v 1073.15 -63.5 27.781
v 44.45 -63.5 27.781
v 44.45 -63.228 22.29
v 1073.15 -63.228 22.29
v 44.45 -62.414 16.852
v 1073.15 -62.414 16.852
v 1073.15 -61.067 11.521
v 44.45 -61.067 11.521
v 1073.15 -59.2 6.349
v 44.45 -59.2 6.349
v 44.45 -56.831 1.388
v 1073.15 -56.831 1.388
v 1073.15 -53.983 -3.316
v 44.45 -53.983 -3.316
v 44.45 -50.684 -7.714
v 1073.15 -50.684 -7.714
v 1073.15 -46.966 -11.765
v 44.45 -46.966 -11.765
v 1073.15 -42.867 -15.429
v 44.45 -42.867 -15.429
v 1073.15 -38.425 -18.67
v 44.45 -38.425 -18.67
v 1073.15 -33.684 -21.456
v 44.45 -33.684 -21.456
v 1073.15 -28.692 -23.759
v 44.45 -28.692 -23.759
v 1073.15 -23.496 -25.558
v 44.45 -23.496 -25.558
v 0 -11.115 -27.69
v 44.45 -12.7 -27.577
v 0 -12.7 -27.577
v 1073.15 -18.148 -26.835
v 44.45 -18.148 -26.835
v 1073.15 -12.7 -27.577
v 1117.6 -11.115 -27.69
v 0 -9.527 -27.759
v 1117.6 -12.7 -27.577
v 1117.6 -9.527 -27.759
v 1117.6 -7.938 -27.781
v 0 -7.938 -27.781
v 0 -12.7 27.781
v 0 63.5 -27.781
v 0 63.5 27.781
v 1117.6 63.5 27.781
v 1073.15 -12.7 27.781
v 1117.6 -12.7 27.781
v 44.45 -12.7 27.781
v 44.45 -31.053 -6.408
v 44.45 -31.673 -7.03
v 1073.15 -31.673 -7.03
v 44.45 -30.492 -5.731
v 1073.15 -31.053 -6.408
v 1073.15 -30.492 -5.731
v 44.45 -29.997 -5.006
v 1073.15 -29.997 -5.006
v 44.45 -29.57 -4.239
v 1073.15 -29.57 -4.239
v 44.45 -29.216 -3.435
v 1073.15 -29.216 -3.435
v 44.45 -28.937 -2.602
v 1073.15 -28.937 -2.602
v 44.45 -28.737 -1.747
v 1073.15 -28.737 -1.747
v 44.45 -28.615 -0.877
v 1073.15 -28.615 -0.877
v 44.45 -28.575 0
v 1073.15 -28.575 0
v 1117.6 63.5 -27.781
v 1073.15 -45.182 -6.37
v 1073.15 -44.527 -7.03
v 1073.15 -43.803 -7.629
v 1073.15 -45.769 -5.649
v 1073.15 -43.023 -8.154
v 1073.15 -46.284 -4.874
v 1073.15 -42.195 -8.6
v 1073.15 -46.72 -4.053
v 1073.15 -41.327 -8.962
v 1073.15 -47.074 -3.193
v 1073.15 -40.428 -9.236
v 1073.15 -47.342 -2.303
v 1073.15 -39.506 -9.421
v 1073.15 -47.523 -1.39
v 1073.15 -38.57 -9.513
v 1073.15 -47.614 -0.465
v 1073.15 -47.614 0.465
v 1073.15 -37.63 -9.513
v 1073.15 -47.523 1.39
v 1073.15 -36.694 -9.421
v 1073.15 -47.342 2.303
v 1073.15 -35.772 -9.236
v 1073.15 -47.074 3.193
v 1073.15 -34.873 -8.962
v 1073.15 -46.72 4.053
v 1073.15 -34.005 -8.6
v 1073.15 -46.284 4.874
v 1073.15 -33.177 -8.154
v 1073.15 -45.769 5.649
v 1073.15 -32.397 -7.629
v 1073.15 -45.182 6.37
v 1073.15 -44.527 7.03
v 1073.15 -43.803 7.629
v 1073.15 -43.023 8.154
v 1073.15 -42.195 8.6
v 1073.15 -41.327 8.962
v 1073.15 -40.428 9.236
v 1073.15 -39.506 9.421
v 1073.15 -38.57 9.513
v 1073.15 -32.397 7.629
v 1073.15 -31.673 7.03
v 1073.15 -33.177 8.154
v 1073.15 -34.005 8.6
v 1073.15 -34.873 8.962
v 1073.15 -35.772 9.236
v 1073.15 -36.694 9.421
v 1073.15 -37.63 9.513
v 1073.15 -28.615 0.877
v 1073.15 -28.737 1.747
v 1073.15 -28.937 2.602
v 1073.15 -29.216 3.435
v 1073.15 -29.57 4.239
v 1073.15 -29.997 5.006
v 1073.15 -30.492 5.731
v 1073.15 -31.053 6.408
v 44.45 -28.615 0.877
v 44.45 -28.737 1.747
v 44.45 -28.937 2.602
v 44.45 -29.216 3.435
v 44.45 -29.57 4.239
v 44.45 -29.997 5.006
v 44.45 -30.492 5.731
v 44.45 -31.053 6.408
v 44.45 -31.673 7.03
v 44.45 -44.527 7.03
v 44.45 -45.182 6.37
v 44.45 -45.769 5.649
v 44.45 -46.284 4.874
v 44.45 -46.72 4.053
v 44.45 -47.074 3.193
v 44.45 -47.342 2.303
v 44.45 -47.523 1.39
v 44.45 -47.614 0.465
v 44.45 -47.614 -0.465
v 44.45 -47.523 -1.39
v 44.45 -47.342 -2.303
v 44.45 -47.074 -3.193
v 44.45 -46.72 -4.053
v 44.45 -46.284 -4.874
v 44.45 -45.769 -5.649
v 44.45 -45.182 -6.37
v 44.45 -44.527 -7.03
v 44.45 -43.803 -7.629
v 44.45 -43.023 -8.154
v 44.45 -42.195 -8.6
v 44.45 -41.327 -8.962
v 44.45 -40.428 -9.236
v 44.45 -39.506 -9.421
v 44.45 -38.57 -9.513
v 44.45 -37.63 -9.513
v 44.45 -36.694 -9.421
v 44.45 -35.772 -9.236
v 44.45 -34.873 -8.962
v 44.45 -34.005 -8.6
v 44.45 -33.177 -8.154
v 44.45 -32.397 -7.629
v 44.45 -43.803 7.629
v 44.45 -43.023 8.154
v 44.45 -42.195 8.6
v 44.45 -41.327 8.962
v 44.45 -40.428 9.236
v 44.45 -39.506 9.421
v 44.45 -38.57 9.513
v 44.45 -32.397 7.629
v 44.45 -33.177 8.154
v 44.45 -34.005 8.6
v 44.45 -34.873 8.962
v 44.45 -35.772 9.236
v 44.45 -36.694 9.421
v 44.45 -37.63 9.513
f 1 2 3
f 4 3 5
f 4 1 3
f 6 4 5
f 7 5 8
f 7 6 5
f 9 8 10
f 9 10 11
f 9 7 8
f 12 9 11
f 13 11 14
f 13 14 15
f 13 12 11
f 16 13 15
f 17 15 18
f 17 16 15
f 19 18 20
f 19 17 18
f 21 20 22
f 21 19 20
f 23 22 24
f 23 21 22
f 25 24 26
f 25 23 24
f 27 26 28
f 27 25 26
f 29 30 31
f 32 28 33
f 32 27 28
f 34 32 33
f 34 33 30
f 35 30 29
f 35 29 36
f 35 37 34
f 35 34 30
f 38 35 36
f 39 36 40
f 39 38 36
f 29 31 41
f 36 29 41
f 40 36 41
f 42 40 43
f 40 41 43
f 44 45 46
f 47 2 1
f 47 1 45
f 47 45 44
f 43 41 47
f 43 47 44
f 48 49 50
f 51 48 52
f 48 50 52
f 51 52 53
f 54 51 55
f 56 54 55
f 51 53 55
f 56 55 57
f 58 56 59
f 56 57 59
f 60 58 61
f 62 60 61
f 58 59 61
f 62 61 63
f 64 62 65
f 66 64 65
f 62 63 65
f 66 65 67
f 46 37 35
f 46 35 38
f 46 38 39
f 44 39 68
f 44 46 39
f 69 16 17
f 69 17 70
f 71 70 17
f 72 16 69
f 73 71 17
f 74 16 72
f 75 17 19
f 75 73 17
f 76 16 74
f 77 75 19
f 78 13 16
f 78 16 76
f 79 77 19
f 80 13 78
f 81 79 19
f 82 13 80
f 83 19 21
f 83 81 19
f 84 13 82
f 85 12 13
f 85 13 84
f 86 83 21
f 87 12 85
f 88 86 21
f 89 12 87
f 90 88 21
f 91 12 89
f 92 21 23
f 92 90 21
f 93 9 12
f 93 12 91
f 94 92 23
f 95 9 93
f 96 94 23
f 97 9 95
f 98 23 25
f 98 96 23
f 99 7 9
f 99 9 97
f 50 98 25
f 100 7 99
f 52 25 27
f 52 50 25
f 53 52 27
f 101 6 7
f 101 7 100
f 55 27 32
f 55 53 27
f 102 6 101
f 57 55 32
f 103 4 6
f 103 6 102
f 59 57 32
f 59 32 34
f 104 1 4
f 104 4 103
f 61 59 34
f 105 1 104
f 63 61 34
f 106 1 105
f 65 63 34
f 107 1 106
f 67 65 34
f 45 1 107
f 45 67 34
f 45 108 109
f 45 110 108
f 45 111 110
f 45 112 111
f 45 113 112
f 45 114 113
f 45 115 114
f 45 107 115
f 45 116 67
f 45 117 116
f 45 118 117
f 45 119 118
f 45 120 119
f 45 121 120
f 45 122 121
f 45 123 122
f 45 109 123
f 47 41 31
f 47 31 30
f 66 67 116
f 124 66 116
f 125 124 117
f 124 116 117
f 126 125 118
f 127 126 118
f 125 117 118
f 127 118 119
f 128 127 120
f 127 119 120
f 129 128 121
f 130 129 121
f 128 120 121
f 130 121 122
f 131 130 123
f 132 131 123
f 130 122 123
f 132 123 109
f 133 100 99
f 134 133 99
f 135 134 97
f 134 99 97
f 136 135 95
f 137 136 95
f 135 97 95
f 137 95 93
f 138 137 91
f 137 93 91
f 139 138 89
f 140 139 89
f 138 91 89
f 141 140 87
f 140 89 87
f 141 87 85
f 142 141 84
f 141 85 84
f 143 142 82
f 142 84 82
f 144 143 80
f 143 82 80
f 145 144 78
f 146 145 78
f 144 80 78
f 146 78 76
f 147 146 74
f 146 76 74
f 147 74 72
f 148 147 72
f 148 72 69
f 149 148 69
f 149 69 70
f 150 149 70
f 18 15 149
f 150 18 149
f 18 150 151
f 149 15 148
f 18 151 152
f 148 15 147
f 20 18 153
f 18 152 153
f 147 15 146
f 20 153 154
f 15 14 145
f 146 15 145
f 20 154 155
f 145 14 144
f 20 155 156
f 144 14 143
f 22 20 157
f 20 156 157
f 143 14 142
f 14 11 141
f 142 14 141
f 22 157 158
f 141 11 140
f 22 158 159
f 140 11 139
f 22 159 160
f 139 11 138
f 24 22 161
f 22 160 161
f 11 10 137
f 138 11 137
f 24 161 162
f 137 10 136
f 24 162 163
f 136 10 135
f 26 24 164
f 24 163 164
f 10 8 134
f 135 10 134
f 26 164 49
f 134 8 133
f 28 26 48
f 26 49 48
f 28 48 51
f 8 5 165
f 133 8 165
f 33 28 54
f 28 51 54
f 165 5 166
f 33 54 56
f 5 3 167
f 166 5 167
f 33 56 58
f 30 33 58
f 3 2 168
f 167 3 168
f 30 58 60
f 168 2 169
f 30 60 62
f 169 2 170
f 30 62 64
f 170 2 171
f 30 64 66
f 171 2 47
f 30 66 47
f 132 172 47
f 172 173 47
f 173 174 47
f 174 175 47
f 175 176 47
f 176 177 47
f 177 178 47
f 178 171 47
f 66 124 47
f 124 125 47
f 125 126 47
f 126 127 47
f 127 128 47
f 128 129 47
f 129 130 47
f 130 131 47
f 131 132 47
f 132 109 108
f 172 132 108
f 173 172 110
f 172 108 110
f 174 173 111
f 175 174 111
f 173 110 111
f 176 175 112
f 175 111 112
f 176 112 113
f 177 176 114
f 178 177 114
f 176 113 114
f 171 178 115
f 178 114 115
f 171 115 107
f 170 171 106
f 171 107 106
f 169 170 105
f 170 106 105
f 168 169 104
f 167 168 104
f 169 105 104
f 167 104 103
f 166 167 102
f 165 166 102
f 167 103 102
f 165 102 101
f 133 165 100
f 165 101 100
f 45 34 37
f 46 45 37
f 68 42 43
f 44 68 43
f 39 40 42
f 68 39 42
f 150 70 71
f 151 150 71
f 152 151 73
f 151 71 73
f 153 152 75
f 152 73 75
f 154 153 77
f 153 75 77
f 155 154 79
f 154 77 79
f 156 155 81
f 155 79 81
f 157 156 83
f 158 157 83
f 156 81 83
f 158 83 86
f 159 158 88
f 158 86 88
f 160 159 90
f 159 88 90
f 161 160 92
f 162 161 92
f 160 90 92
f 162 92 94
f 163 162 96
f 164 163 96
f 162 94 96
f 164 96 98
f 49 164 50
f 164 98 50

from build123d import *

# Parameters (mm, degrees)
F0_W     = 127
F0_H     = 55.5625
F1_DEPTH = 1117.6
F2_W     = 44.45
F2_H     = 50.8
F3_DEPTH = 55.5635
F5_DEPTH = 1073.151
F6_R     = 55.56249


# Not quite as in the source:
# - a fillet or chamfer is up to 0.001 mm smaller than in the source, because OpenCascade refuses the exact size


with BuildPart() as f1:
    # F0 (on Right) → F1 (new body)
    with BuildSketch(Plane.YZ):
        Rectangle(F0_W, F0_H)
    extrude(amount=F1_DEPTH)

    # F2 (on face) → F3 (cut, through all)
    with BuildSketch(Plane.XY.offset(27.78125)):
        with Locations((22.225, -38.1)):
            Rectangle(F2_W, F2_H)
        with Locations((1095.375, -38.1)):
            Rectangle(F2_W, F2_H)
    extrude(amount=-F3_DEPTH, mode=Mode.SUBTRACT)

    # F4 (on face) → F5 (cut, through all)
    with BuildSketch(Plane.YZ.offset(1073.15)):
        with BuildLine():
            Line((-38.1, 0), (-44.5271766257, -7.0297244343))
            ThreePointArc((-44.5271766257, -7.0297244343), (-38.1, -9.525), (-31.6728233743, -7.0297244343))
            Line((-31.6728233743, -7.0297244343), (-38.1, 0))
        make_face()
        with BuildLine():
            ThreePointArc((-44.5271766257, 7.0297244343), (-47.625, 0), (-44.5271766257, -7.0297244343))
            Line((-44.5271766257, -7.0297244343), (-38.1, 0))
            Line((-38.1, 0), (-44.5271766257, 7.0297244343))
        make_face()
        with BuildLine():
            Line((-44.5271766257, 7.0297244343), (-38.1, 0))
            Line((-38.1, 0), (-31.6728233743, 7.0297244343))
            ThreePointArc((-31.6728233743, 7.0297244343), (-38.1, 9.525), (-44.5271766257, 7.0297244343))
        make_face()
        with BuildLine():
            Line((-31.6728233743, 7.0297244343), (-38.1, 0))
            Line((-38.1, 0), (-31.6728233743, -7.0297244343))
            ThreePointArc((-31.6728233743, -7.0297244343), (-29.3837943359, -3.8410133845), (-28.575, 0))
            ThreePointArc((-28.575, 0), (-29.3837943359, 3.8410133845), (-31.6728233743, 7.0297244343))
        make_face()
    extrude(amount=-F5_DEPTH, mode=Mode.SUBTRACT)

    # F6 (radius 55.5625 in the source; OpenCascade refuses exactly that, so slightly less here)
    f6_edges = [f1.edges().sort_by_distance(p)[0] for p in [
        (558.8, -63.5, -27.78125),
    ]]
    fillet(f6_edges, radius=F6_R)


solid = f1.part
